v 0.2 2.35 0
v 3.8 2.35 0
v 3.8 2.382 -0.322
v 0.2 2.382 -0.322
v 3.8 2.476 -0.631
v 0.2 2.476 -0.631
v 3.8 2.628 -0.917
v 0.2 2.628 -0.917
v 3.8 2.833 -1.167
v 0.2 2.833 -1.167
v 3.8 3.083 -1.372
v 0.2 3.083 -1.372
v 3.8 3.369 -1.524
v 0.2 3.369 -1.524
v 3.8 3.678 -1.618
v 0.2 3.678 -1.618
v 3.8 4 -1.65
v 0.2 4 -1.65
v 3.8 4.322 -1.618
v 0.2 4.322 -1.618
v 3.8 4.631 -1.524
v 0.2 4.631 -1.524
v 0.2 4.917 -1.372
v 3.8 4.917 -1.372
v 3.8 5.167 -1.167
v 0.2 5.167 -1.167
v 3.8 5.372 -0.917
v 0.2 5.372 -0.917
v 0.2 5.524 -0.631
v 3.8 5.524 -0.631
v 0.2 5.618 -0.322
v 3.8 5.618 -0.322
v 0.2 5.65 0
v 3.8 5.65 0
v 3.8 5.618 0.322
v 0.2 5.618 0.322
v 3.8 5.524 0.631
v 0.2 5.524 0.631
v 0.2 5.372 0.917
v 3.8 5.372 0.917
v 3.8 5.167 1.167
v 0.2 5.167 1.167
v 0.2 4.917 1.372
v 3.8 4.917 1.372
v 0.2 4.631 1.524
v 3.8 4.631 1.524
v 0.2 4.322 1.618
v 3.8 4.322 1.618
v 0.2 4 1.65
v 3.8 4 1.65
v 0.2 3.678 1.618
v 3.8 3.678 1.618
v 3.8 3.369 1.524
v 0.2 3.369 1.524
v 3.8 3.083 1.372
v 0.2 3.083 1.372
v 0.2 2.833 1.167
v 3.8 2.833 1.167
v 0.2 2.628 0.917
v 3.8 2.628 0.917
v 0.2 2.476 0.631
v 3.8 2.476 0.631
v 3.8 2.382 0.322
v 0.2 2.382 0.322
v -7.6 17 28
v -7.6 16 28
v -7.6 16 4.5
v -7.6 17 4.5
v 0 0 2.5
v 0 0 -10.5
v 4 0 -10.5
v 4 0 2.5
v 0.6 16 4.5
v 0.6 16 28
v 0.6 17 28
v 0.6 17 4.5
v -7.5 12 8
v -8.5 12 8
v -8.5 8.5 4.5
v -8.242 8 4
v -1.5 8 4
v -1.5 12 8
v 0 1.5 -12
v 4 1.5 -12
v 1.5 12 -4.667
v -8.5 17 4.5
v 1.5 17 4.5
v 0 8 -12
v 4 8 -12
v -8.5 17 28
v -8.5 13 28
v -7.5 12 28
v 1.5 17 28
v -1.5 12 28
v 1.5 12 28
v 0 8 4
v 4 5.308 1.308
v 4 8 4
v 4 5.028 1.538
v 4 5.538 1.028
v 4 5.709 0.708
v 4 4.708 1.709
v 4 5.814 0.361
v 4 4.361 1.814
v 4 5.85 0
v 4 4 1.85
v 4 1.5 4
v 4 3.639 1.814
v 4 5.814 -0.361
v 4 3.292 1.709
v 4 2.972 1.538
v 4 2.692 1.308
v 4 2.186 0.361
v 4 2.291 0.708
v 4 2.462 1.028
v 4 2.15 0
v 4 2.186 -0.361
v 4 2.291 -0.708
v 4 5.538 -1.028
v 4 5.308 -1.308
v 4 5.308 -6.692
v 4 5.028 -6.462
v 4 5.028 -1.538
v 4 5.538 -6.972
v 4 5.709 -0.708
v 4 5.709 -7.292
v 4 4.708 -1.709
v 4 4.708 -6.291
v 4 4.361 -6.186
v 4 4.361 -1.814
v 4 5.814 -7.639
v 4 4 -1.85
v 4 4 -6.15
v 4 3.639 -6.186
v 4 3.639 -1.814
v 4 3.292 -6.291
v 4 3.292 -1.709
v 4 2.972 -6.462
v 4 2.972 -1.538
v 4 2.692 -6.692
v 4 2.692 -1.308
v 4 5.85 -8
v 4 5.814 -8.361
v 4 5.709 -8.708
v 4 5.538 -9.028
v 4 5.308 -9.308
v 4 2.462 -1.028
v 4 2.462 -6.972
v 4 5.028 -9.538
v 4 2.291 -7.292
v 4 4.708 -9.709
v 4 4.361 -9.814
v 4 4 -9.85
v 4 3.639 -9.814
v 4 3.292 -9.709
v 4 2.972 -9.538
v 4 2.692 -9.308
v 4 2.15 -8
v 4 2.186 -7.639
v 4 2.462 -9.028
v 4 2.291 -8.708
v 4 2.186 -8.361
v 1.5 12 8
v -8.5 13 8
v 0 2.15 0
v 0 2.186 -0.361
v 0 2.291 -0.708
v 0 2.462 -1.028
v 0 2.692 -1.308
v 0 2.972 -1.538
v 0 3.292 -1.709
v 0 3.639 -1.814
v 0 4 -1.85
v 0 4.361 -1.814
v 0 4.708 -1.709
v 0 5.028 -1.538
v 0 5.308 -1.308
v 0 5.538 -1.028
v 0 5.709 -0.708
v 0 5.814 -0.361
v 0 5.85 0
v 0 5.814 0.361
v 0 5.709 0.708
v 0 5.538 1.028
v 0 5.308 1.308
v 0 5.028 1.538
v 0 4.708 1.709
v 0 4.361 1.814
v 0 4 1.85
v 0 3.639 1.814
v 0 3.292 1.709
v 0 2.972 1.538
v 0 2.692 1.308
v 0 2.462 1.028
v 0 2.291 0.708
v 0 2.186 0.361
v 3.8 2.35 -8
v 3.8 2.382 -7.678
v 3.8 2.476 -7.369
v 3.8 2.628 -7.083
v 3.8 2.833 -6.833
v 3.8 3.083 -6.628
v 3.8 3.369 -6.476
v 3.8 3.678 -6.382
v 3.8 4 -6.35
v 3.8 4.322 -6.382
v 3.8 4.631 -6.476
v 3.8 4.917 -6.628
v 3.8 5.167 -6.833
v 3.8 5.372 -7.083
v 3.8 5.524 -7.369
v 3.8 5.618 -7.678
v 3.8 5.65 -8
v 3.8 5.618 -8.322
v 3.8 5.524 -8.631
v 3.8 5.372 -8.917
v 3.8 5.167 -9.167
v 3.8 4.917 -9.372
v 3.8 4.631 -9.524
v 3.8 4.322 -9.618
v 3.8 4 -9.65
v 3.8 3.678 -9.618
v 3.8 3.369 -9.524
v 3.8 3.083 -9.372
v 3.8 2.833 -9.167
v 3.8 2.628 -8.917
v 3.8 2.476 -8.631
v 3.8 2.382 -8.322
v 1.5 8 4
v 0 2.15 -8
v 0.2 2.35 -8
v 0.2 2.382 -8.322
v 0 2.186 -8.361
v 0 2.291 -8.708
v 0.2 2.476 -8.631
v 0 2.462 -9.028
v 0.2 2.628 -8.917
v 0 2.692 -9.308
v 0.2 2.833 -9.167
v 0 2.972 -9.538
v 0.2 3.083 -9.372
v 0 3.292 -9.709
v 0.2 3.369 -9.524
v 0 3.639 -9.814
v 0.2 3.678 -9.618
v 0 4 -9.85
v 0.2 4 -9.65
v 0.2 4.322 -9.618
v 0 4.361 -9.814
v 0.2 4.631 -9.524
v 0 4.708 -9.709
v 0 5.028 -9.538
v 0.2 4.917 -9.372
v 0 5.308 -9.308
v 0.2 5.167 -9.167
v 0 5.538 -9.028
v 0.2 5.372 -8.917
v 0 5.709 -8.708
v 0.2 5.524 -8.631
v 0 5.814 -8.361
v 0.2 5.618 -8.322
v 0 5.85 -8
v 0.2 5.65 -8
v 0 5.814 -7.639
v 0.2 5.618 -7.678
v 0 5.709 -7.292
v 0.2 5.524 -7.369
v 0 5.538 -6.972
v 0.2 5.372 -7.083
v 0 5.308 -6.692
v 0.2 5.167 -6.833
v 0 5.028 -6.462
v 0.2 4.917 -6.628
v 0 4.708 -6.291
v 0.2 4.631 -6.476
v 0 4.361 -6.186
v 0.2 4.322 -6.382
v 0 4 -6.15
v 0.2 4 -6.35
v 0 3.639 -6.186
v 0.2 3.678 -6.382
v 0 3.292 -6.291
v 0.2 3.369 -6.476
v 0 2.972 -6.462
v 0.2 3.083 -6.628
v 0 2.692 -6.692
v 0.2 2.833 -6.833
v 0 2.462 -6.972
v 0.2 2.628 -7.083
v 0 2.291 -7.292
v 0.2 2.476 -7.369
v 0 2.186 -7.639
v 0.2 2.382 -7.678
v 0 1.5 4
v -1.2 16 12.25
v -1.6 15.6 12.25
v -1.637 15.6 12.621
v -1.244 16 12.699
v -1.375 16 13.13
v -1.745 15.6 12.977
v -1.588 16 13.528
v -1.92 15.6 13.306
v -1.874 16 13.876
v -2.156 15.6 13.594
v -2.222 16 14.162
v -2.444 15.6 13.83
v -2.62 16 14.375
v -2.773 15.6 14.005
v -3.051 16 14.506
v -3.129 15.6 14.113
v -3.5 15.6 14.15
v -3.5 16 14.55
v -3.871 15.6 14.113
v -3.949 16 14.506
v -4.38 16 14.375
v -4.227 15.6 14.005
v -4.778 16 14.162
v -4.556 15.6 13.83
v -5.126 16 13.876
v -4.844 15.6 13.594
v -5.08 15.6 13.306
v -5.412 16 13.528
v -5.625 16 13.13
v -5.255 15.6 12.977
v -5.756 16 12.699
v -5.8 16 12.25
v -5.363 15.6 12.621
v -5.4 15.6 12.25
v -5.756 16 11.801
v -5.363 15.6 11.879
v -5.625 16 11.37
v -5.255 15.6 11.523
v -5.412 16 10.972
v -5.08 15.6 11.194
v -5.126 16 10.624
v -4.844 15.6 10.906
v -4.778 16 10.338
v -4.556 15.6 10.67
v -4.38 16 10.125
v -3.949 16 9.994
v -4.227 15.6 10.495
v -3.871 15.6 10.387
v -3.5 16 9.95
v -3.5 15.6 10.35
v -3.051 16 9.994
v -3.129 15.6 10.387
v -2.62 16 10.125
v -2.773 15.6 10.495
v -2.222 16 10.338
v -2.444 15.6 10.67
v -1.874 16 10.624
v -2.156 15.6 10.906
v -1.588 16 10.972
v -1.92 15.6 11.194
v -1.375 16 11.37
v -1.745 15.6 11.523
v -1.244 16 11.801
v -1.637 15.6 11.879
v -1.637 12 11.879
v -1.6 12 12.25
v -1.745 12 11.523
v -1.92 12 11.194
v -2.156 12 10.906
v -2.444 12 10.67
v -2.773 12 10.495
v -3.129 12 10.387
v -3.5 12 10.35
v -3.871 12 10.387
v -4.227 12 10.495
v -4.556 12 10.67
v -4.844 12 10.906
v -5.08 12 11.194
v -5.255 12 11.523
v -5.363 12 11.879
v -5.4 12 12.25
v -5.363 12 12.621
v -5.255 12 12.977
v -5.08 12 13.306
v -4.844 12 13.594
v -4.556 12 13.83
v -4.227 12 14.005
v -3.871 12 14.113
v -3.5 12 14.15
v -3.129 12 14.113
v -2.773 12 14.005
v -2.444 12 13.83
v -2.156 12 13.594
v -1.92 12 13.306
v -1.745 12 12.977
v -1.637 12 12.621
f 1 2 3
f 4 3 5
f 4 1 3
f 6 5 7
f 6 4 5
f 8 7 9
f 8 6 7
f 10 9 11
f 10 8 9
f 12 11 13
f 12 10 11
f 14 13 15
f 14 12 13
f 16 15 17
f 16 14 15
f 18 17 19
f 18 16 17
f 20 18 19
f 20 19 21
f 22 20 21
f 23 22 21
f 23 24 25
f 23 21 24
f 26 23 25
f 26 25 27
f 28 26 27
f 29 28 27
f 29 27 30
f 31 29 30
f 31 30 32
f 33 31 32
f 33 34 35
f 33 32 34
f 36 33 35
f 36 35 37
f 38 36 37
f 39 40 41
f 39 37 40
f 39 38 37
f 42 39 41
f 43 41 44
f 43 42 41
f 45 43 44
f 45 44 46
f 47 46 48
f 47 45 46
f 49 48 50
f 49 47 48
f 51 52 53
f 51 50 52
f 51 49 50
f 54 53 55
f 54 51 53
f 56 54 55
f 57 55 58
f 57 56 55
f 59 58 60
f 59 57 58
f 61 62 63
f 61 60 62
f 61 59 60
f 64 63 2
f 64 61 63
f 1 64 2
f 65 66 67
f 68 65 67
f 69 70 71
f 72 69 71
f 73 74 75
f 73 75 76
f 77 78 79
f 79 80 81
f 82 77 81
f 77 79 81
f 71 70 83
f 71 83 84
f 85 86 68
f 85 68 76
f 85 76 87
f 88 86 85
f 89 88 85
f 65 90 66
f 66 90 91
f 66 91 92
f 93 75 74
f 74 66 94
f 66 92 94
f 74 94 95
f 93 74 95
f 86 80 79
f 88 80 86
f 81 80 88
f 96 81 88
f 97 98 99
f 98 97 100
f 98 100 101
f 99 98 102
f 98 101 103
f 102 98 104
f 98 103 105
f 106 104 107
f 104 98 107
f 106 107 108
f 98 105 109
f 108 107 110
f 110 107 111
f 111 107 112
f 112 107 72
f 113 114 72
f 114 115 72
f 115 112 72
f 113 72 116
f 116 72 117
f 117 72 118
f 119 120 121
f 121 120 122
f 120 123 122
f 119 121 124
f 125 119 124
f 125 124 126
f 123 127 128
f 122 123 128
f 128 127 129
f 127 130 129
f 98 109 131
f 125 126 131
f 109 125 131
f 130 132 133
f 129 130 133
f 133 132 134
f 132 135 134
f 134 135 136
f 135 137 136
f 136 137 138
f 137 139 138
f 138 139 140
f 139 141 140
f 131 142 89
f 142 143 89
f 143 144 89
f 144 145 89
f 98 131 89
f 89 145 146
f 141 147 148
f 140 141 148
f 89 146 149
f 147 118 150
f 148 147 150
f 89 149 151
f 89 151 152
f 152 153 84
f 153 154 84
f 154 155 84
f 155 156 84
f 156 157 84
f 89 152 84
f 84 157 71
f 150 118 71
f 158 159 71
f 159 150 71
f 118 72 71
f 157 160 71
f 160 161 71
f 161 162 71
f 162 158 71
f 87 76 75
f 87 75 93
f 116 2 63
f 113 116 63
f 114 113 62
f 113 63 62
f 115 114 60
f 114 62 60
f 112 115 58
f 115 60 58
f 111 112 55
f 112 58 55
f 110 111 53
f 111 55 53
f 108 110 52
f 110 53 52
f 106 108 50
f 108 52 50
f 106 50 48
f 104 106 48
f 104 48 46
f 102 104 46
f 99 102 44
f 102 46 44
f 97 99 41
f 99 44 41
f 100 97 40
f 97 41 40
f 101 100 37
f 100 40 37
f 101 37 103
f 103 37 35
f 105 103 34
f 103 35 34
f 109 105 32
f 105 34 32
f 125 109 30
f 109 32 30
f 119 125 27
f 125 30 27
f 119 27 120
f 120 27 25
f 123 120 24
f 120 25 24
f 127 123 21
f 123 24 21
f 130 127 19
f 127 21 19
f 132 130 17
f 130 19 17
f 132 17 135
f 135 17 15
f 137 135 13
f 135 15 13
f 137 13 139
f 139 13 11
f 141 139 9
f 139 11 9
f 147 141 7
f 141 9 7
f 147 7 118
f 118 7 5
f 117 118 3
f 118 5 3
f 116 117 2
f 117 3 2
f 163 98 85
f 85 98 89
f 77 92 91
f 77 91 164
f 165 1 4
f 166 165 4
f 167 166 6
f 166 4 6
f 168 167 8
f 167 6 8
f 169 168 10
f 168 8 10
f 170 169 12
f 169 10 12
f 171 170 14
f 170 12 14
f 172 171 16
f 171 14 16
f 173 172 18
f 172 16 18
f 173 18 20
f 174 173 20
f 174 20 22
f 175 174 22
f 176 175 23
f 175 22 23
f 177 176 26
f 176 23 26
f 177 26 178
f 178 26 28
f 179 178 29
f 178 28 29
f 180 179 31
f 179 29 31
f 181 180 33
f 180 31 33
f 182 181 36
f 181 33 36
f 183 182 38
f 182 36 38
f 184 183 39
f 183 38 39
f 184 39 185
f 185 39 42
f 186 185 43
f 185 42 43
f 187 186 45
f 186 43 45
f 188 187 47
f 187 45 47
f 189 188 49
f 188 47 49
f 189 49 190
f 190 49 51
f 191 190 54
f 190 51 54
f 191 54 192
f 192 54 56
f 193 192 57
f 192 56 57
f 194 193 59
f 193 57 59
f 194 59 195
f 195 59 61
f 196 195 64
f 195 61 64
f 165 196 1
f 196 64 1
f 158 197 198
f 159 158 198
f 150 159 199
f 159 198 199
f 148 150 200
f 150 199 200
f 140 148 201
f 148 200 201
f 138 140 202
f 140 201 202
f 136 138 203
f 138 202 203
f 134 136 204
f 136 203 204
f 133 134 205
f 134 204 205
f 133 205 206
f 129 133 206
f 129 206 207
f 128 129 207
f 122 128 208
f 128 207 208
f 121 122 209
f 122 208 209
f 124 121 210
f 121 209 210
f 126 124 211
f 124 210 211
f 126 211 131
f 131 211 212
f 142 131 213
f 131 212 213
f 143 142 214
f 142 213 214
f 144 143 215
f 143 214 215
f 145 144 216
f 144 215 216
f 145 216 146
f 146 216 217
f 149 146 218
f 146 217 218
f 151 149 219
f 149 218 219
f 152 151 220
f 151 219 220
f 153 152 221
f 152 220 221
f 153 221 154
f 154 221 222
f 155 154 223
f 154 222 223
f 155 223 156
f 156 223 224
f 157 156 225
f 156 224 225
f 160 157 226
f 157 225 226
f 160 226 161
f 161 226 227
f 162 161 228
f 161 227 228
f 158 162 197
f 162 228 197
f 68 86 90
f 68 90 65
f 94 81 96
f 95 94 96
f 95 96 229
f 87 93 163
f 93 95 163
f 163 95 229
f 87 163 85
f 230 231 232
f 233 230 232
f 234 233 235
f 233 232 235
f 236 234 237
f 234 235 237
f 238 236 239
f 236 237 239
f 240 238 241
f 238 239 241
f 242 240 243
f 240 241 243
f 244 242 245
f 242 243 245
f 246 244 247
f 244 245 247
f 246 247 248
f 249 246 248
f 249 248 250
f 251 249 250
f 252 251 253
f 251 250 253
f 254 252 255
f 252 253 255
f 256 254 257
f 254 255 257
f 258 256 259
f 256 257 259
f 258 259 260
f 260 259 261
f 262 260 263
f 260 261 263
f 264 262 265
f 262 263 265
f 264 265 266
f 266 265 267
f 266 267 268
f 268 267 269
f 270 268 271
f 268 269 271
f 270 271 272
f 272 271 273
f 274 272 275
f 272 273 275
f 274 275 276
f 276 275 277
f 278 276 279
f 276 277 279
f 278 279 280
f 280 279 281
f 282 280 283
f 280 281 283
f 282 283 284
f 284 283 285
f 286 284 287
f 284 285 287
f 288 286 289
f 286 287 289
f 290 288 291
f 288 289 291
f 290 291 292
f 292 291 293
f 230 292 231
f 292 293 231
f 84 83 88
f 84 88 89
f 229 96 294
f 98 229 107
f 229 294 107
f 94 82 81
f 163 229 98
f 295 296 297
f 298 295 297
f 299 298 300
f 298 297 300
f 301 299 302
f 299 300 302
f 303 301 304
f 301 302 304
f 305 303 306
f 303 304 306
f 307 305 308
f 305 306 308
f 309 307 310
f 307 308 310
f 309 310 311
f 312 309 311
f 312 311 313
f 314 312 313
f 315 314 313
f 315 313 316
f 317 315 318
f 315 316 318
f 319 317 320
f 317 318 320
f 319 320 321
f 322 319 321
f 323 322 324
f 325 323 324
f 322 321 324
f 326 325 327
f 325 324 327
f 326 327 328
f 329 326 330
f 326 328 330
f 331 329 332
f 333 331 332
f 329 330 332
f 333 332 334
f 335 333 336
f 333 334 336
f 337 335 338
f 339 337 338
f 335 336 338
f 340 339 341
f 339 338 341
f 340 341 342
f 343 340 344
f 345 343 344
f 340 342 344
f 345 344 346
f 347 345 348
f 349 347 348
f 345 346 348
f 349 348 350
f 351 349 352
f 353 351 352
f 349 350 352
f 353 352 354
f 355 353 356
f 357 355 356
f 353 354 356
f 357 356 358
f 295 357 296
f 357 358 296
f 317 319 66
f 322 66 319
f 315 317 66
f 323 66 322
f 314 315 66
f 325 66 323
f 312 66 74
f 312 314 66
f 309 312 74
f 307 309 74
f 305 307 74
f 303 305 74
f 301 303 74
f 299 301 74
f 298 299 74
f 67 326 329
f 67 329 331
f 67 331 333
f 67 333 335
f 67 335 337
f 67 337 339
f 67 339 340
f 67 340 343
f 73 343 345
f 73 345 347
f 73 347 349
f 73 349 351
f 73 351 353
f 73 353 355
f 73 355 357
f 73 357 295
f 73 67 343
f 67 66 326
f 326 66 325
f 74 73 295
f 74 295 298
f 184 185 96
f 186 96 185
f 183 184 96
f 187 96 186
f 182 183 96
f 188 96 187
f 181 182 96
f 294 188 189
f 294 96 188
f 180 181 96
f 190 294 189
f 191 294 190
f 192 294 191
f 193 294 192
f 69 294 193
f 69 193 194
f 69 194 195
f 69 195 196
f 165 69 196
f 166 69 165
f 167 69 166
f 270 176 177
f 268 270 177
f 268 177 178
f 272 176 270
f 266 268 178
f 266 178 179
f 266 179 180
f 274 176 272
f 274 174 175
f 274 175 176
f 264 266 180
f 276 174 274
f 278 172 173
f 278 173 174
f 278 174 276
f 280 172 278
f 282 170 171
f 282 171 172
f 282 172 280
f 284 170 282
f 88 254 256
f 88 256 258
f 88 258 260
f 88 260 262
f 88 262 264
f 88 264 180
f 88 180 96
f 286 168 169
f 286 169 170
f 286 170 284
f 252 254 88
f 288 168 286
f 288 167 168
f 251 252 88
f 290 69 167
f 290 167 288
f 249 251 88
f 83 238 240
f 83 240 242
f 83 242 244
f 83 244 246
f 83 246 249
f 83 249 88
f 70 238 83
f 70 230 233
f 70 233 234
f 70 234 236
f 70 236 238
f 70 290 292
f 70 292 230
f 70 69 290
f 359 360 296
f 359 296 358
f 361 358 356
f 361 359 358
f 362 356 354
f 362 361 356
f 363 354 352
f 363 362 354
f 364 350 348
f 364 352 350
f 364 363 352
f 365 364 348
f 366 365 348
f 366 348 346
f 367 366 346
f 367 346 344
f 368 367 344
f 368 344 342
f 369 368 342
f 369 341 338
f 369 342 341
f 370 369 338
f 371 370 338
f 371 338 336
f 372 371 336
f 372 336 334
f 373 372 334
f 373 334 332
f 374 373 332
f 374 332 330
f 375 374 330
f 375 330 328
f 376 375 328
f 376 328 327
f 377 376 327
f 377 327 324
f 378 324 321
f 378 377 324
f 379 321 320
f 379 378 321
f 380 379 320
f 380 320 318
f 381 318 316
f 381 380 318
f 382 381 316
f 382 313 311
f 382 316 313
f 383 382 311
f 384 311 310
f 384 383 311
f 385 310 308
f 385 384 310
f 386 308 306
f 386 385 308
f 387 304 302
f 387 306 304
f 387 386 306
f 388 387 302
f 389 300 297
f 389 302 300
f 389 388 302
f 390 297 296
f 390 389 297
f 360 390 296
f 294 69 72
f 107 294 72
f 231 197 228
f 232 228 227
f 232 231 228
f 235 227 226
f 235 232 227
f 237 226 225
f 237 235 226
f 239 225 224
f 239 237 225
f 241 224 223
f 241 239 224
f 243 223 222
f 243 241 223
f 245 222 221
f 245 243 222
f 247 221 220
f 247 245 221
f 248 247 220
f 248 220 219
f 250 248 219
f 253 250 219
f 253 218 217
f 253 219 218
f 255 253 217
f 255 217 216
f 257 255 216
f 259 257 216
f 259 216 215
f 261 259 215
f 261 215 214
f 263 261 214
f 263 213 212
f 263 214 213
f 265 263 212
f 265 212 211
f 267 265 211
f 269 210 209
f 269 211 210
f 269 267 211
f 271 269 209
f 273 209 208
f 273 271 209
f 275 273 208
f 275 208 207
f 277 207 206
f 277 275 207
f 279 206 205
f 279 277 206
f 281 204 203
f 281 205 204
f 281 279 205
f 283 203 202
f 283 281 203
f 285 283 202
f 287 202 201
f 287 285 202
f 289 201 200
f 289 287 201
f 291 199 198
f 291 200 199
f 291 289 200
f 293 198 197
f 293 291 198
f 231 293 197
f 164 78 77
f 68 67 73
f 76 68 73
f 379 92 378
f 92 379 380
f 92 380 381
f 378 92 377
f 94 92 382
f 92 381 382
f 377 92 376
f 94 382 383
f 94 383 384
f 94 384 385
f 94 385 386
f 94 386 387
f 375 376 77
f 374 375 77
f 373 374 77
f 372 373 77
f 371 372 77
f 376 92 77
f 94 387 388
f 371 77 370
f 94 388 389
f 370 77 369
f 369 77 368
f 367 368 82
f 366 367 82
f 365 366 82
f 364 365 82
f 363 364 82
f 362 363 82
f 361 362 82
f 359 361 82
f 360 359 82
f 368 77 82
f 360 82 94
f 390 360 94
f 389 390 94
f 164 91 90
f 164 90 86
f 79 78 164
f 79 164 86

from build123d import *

# Parameters (mm, degrees)
CYLINDER004_R                       = 1.9
CYLINDER004_DEPTH                   = 10
BOX011_W                            = 8.2
BOX011_H                            = 24
BOX011_DEPTH                        = 5
BOX012_W                            = 15
BOX012_H                            = 21
BOX012_DEPTH                        = 17
CHAMFER013_SIZE2                    = 16.5
CHAMFER013_SIZE                     = 9
BOX010_W                            = 12.5
BOX010_H                            = 21.5
BOX010_DEPTH                        = 10
CHAMFER009_SIZE2                    = 2.5
CHAMFER009_SIZE                     = 4
BOX008_W                            = 12.5
BOX008_H                            = 20
BOX008_DEPTH                        = 9
CHAMFER010_SIZE                     = 4
CHAMFER012_SIZE2                    = 8.5
CHAMFER012_SIZE                     = 16.5
BOX013_W                            = 3
BOX013_H                            = 24.5
BOX013_DEPTH                        = 5
CHAMFER023004_SIZE2                 = 24
CHAMFER023004_SIZE                  = 4
BOX009_W                            = 10
BOX009_H                            = 23.5
BOX009_DEPTH                        = 5
CHAMFER023003_SIZE                  = 1
CYLINDER002_R                       = 1.65
CYLINDER002_DEPTH                   = 10
CYLINDER003_R                       = 1.65
CYLINDER003_DEPTH                   = 10
BOX007_W                            = 4
BOX007_H                            = 16
BOX007_DEPTH                        = 8
CHAMFER011_SIZE                     = 1.5
CHAMFER023006002_SIZE               = 0.4
CHAMFER023006003_SIZE               = 0.2
CHAMFER023006003001_PLACEMENT_ANGLE = 90


with BuildPart() as cylinder004:
    # Cylinder004 → Cylinder004 (new body)
    with BuildSketch(Plane(origin=(-3.5, -12.25, 10), x_dir=(1, 0, 0), z_dir=(0, 0, 1))):
        Circle(CYLINDER004_R)
    extrude(amount=CYLINDER004_DEPTH)


with BuildPart() as cube011:
    # Box011 → Box011 (new body)
    with BuildSketch(Plane(origin=(-7.6, -28.5, 16), x_dir=(1, 0, 0), z_dir=(0, 0, 1))):
        with Locations((4.1, 12)):
            Rectangle(BOX011_W, BOX011_H)
    extrude(amount=BOX011_DEPTH)


with BuildPart() as chamfer013:
    # Box012 → Box012 (new body)
    with BuildSketch(Plane(origin=(-10.8, -4.5, 8), x_dir=(1, 0, 0), z_dir=(0, 0, 1))):
        with Locations((7.5, 10.5)):
            Rectangle(BOX012_W, BOX012_H)
    extrude(amount=BOX012_DEPTH)

    # Chamfer013
    chamfer013_edges = [chamfer013.edges().sort_by_distance(p)[0] for p in [
        (-3.3, -4.5, 8),
    ]]
    chamfer013_side = chamfer013.faces().sort_by_distance((-3.3, -4.5, 16.5))[0]
    chamfer(chamfer013_edges, length=CHAMFER013_SIZE, length2=CHAMFER013_SIZE2, reference=chamfer013_side)


with BuildPart() as chamfer009:
    # Box010 → Box010 (new body)
    with BuildSketch(Plane(origin=(1.5, -9.5, 8), x_dir=(1, 0, 0), z_dir=(0, 0, 1))):
        with Locations((6.25, 10.75)):
            Rectangle(BOX010_W, BOX010_H)
    extrude(amount=BOX010_DEPTH)

    # Chamfer009
    chamfer009_edges = [chamfer009.edges().sort_by_distance(p)[0] for p in [
        (1.5, 1.25, 8),
    ]]
    chamfer009_side = chamfer009.faces().sort_by_distance((1.5, 1.25, 13))[0]
    chamfer(chamfer009_edges, length=CHAMFER009_SIZE, length2=CHAMFER009_SIZE2, reference=chamfer009_side)


with BuildPart() as cut003001004:
    # Box008 → Box008 (new body)
    with BuildSketch(Plane(origin=(-8.5, -8, 8), x_dir=(1, 0, 0), z_dir=(0, 0, 1))):
        with Locations((6.25, 10)):
            Rectangle(BOX008_W, BOX008_H)
    extrude(amount=BOX008_DEPTH)

    # Chamfer010
    chamfer010_edges = [cut003001004.edges().sort_by_distance(p)[0] for p in [
        (-2.25, -8, 8),
    ]]
    chamfer(chamfer010_edges, length=CHAMFER010_SIZE)

    # Cut003001002: cut Chamfer009
    add(chamfer009.part, mode=Mode.SUBTRACT)

    # Chamfer012
    chamfer012_edges = [cut003001004.edges().sort_by_distance(p)[0] for p in [
        (-8.5, 12, 12.5),
    ]]
    chamfer012_side = cut003001004.faces().sort_by_distance((-8.5, 2.403101, 12.647287))[0]
    chamfer(chamfer012_edges, length=CHAMFER012_SIZE, length2=CHAMFER012_SIZE2, reference=chamfer012_side)

    # Cut003001004: cut Chamfer013
    add(chamfer013.part, mode=Mode.SUBTRACT)


with BuildPart() as chamfer023004:
    # Box013 → Box013 (new body)
    with BuildSketch(Plane(origin=(-1.5, -3.5, 13), x_dir=(1, 0, 0), z_dir=(0, 0, -1))):
        with Locations((1.5, 12.25)):
            Rectangle(BOX013_W, BOX013_H)
    extrude(amount=BOX013_DEPTH)

    # Chamfer023004
    chamfer023004_edges = [chamfer023004.edges().sort_by_distance(p)[0] for p in [
        (0, -28, 8),
    ]]
    chamfer023004_side = chamfer023004.faces().sort_by_distance((0, -28, 10.5))[0]
    chamfer(chamfer023004_edges, length=CHAMFER023004_SIZE, length2=CHAMFER023004_SIZE2, reference=chamfer023004_side)


with BuildPart() as chamfer023003:
    # Box009 → Box009 (new body)
    with BuildSketch(Plane(origin=(-8.5, -28, 12), x_dir=(1, 0, 0), z_dir=(0, 0, 1))):
        with Locations((5, 11.75)):
            Rectangle(BOX009_W, BOX009_H)
    extrude(amount=BOX009_DEPTH)

    # Chamfer023003
    chamfer023003_edges = [chamfer023003.edges().sort_by_distance(p)[0] for p in [
        (-8.5, -16.25, 12),
        (1.5, -16.25, 12),
    ]]
    chamfer(chamfer023003_edges, length=CHAMFER023003_SIZE)


with BuildPart() as cylinder002:
    # Cylinder002 → Cylinder002 (new body)
    with BuildSketch(Plane(origin=(0, 0, 4), x_dir=(0, 0, -1), z_dir=(1, 0, 0))):
        Circle(CYLINDER002_R)
    extrude(amount=CYLINDER002_DEPTH)


with BuildPart() as fusion001003:
    # Cylinder003 → Cylinder003 (new body)
    with BuildSketch(Plane(origin=(0, 8, 4), x_dir=(0, 0, -1), z_dir=(1, 0, 0))):
        Circle(CYLINDER003_R)
    extrude(amount=CYLINDER003_DEPTH)

    # Fusion001003: union Cylinder002
    add(cylinder002.part)


with BuildPart() as chamfer023006003001:
    # Box007 → Box007 (new body)
    with BuildSketch(Plane(origin=(0, -4, 0), x_dir=(1, 0, 0), z_dir=(0, 0, 1))):
        with Locations((2, 8)):
            Rectangle(BOX007_W, BOX007_H)
    extrude(amount=BOX007_DEPTH)

    # Chamfer011
    chamfer011_edges = [chamfer023006003001.edges().sort_by_distance(p)[0] for p in [
        (2, -4, 0),
        (2, 12, 0),
    ]]
    chamfer(chamfer011_edges, length=CHAMFER011_SIZE)

    # Cut003001003: cut Fusion001003
    add(fusion001003.part, mode=Mode.SUBTRACT)

    # Fusion001004: union Cut003001004, Chamfer023004, Chamfer023003
    add(cut003001004.part)
    add(chamfer023004.part)
    add(chamfer023003.part)

    # Cut003001015: cut Cube011
    add(cube011.part, mode=Mode.SUBTRACT)

    # Cut003001016: cut Cylinder004
    add(cylinder004.part, mode=Mode.SUBTRACT)

    # Chamfer023006002
    chamfer023006002_edges = [chamfer023006003001.edges().sort_by_distance(p)[0] for p in [
        (-5.4, -12.25, 16),
    ]]
    chamfer(chamfer023006002_edges, length=CHAMFER023006002_SIZE)

    # Chamfer023006003
    chamfer023006003_edges = [chamfer023006003001.edges().sort_by_distance(p)[0] for p in [
        (0, 8, 5.65),
        (0, 0, 5.65),
        (4, 8, 5.65),
        (4, 0, 5.65),
    ]]
    chamfer(chamfer023006003_edges, length=CHAMFER023006003_SIZE)


with BuildPart() as chamfer023006003001_1:
    # Chamfer023006003001 placement: moved
    add(chamfer023006003001.part.rotate(Axis((0, 0, 0), (-1, 0, 0)), CHAMFER023006003001_PLACEMENT_ANGLE))


solid = chamfer023006003001_1.part
